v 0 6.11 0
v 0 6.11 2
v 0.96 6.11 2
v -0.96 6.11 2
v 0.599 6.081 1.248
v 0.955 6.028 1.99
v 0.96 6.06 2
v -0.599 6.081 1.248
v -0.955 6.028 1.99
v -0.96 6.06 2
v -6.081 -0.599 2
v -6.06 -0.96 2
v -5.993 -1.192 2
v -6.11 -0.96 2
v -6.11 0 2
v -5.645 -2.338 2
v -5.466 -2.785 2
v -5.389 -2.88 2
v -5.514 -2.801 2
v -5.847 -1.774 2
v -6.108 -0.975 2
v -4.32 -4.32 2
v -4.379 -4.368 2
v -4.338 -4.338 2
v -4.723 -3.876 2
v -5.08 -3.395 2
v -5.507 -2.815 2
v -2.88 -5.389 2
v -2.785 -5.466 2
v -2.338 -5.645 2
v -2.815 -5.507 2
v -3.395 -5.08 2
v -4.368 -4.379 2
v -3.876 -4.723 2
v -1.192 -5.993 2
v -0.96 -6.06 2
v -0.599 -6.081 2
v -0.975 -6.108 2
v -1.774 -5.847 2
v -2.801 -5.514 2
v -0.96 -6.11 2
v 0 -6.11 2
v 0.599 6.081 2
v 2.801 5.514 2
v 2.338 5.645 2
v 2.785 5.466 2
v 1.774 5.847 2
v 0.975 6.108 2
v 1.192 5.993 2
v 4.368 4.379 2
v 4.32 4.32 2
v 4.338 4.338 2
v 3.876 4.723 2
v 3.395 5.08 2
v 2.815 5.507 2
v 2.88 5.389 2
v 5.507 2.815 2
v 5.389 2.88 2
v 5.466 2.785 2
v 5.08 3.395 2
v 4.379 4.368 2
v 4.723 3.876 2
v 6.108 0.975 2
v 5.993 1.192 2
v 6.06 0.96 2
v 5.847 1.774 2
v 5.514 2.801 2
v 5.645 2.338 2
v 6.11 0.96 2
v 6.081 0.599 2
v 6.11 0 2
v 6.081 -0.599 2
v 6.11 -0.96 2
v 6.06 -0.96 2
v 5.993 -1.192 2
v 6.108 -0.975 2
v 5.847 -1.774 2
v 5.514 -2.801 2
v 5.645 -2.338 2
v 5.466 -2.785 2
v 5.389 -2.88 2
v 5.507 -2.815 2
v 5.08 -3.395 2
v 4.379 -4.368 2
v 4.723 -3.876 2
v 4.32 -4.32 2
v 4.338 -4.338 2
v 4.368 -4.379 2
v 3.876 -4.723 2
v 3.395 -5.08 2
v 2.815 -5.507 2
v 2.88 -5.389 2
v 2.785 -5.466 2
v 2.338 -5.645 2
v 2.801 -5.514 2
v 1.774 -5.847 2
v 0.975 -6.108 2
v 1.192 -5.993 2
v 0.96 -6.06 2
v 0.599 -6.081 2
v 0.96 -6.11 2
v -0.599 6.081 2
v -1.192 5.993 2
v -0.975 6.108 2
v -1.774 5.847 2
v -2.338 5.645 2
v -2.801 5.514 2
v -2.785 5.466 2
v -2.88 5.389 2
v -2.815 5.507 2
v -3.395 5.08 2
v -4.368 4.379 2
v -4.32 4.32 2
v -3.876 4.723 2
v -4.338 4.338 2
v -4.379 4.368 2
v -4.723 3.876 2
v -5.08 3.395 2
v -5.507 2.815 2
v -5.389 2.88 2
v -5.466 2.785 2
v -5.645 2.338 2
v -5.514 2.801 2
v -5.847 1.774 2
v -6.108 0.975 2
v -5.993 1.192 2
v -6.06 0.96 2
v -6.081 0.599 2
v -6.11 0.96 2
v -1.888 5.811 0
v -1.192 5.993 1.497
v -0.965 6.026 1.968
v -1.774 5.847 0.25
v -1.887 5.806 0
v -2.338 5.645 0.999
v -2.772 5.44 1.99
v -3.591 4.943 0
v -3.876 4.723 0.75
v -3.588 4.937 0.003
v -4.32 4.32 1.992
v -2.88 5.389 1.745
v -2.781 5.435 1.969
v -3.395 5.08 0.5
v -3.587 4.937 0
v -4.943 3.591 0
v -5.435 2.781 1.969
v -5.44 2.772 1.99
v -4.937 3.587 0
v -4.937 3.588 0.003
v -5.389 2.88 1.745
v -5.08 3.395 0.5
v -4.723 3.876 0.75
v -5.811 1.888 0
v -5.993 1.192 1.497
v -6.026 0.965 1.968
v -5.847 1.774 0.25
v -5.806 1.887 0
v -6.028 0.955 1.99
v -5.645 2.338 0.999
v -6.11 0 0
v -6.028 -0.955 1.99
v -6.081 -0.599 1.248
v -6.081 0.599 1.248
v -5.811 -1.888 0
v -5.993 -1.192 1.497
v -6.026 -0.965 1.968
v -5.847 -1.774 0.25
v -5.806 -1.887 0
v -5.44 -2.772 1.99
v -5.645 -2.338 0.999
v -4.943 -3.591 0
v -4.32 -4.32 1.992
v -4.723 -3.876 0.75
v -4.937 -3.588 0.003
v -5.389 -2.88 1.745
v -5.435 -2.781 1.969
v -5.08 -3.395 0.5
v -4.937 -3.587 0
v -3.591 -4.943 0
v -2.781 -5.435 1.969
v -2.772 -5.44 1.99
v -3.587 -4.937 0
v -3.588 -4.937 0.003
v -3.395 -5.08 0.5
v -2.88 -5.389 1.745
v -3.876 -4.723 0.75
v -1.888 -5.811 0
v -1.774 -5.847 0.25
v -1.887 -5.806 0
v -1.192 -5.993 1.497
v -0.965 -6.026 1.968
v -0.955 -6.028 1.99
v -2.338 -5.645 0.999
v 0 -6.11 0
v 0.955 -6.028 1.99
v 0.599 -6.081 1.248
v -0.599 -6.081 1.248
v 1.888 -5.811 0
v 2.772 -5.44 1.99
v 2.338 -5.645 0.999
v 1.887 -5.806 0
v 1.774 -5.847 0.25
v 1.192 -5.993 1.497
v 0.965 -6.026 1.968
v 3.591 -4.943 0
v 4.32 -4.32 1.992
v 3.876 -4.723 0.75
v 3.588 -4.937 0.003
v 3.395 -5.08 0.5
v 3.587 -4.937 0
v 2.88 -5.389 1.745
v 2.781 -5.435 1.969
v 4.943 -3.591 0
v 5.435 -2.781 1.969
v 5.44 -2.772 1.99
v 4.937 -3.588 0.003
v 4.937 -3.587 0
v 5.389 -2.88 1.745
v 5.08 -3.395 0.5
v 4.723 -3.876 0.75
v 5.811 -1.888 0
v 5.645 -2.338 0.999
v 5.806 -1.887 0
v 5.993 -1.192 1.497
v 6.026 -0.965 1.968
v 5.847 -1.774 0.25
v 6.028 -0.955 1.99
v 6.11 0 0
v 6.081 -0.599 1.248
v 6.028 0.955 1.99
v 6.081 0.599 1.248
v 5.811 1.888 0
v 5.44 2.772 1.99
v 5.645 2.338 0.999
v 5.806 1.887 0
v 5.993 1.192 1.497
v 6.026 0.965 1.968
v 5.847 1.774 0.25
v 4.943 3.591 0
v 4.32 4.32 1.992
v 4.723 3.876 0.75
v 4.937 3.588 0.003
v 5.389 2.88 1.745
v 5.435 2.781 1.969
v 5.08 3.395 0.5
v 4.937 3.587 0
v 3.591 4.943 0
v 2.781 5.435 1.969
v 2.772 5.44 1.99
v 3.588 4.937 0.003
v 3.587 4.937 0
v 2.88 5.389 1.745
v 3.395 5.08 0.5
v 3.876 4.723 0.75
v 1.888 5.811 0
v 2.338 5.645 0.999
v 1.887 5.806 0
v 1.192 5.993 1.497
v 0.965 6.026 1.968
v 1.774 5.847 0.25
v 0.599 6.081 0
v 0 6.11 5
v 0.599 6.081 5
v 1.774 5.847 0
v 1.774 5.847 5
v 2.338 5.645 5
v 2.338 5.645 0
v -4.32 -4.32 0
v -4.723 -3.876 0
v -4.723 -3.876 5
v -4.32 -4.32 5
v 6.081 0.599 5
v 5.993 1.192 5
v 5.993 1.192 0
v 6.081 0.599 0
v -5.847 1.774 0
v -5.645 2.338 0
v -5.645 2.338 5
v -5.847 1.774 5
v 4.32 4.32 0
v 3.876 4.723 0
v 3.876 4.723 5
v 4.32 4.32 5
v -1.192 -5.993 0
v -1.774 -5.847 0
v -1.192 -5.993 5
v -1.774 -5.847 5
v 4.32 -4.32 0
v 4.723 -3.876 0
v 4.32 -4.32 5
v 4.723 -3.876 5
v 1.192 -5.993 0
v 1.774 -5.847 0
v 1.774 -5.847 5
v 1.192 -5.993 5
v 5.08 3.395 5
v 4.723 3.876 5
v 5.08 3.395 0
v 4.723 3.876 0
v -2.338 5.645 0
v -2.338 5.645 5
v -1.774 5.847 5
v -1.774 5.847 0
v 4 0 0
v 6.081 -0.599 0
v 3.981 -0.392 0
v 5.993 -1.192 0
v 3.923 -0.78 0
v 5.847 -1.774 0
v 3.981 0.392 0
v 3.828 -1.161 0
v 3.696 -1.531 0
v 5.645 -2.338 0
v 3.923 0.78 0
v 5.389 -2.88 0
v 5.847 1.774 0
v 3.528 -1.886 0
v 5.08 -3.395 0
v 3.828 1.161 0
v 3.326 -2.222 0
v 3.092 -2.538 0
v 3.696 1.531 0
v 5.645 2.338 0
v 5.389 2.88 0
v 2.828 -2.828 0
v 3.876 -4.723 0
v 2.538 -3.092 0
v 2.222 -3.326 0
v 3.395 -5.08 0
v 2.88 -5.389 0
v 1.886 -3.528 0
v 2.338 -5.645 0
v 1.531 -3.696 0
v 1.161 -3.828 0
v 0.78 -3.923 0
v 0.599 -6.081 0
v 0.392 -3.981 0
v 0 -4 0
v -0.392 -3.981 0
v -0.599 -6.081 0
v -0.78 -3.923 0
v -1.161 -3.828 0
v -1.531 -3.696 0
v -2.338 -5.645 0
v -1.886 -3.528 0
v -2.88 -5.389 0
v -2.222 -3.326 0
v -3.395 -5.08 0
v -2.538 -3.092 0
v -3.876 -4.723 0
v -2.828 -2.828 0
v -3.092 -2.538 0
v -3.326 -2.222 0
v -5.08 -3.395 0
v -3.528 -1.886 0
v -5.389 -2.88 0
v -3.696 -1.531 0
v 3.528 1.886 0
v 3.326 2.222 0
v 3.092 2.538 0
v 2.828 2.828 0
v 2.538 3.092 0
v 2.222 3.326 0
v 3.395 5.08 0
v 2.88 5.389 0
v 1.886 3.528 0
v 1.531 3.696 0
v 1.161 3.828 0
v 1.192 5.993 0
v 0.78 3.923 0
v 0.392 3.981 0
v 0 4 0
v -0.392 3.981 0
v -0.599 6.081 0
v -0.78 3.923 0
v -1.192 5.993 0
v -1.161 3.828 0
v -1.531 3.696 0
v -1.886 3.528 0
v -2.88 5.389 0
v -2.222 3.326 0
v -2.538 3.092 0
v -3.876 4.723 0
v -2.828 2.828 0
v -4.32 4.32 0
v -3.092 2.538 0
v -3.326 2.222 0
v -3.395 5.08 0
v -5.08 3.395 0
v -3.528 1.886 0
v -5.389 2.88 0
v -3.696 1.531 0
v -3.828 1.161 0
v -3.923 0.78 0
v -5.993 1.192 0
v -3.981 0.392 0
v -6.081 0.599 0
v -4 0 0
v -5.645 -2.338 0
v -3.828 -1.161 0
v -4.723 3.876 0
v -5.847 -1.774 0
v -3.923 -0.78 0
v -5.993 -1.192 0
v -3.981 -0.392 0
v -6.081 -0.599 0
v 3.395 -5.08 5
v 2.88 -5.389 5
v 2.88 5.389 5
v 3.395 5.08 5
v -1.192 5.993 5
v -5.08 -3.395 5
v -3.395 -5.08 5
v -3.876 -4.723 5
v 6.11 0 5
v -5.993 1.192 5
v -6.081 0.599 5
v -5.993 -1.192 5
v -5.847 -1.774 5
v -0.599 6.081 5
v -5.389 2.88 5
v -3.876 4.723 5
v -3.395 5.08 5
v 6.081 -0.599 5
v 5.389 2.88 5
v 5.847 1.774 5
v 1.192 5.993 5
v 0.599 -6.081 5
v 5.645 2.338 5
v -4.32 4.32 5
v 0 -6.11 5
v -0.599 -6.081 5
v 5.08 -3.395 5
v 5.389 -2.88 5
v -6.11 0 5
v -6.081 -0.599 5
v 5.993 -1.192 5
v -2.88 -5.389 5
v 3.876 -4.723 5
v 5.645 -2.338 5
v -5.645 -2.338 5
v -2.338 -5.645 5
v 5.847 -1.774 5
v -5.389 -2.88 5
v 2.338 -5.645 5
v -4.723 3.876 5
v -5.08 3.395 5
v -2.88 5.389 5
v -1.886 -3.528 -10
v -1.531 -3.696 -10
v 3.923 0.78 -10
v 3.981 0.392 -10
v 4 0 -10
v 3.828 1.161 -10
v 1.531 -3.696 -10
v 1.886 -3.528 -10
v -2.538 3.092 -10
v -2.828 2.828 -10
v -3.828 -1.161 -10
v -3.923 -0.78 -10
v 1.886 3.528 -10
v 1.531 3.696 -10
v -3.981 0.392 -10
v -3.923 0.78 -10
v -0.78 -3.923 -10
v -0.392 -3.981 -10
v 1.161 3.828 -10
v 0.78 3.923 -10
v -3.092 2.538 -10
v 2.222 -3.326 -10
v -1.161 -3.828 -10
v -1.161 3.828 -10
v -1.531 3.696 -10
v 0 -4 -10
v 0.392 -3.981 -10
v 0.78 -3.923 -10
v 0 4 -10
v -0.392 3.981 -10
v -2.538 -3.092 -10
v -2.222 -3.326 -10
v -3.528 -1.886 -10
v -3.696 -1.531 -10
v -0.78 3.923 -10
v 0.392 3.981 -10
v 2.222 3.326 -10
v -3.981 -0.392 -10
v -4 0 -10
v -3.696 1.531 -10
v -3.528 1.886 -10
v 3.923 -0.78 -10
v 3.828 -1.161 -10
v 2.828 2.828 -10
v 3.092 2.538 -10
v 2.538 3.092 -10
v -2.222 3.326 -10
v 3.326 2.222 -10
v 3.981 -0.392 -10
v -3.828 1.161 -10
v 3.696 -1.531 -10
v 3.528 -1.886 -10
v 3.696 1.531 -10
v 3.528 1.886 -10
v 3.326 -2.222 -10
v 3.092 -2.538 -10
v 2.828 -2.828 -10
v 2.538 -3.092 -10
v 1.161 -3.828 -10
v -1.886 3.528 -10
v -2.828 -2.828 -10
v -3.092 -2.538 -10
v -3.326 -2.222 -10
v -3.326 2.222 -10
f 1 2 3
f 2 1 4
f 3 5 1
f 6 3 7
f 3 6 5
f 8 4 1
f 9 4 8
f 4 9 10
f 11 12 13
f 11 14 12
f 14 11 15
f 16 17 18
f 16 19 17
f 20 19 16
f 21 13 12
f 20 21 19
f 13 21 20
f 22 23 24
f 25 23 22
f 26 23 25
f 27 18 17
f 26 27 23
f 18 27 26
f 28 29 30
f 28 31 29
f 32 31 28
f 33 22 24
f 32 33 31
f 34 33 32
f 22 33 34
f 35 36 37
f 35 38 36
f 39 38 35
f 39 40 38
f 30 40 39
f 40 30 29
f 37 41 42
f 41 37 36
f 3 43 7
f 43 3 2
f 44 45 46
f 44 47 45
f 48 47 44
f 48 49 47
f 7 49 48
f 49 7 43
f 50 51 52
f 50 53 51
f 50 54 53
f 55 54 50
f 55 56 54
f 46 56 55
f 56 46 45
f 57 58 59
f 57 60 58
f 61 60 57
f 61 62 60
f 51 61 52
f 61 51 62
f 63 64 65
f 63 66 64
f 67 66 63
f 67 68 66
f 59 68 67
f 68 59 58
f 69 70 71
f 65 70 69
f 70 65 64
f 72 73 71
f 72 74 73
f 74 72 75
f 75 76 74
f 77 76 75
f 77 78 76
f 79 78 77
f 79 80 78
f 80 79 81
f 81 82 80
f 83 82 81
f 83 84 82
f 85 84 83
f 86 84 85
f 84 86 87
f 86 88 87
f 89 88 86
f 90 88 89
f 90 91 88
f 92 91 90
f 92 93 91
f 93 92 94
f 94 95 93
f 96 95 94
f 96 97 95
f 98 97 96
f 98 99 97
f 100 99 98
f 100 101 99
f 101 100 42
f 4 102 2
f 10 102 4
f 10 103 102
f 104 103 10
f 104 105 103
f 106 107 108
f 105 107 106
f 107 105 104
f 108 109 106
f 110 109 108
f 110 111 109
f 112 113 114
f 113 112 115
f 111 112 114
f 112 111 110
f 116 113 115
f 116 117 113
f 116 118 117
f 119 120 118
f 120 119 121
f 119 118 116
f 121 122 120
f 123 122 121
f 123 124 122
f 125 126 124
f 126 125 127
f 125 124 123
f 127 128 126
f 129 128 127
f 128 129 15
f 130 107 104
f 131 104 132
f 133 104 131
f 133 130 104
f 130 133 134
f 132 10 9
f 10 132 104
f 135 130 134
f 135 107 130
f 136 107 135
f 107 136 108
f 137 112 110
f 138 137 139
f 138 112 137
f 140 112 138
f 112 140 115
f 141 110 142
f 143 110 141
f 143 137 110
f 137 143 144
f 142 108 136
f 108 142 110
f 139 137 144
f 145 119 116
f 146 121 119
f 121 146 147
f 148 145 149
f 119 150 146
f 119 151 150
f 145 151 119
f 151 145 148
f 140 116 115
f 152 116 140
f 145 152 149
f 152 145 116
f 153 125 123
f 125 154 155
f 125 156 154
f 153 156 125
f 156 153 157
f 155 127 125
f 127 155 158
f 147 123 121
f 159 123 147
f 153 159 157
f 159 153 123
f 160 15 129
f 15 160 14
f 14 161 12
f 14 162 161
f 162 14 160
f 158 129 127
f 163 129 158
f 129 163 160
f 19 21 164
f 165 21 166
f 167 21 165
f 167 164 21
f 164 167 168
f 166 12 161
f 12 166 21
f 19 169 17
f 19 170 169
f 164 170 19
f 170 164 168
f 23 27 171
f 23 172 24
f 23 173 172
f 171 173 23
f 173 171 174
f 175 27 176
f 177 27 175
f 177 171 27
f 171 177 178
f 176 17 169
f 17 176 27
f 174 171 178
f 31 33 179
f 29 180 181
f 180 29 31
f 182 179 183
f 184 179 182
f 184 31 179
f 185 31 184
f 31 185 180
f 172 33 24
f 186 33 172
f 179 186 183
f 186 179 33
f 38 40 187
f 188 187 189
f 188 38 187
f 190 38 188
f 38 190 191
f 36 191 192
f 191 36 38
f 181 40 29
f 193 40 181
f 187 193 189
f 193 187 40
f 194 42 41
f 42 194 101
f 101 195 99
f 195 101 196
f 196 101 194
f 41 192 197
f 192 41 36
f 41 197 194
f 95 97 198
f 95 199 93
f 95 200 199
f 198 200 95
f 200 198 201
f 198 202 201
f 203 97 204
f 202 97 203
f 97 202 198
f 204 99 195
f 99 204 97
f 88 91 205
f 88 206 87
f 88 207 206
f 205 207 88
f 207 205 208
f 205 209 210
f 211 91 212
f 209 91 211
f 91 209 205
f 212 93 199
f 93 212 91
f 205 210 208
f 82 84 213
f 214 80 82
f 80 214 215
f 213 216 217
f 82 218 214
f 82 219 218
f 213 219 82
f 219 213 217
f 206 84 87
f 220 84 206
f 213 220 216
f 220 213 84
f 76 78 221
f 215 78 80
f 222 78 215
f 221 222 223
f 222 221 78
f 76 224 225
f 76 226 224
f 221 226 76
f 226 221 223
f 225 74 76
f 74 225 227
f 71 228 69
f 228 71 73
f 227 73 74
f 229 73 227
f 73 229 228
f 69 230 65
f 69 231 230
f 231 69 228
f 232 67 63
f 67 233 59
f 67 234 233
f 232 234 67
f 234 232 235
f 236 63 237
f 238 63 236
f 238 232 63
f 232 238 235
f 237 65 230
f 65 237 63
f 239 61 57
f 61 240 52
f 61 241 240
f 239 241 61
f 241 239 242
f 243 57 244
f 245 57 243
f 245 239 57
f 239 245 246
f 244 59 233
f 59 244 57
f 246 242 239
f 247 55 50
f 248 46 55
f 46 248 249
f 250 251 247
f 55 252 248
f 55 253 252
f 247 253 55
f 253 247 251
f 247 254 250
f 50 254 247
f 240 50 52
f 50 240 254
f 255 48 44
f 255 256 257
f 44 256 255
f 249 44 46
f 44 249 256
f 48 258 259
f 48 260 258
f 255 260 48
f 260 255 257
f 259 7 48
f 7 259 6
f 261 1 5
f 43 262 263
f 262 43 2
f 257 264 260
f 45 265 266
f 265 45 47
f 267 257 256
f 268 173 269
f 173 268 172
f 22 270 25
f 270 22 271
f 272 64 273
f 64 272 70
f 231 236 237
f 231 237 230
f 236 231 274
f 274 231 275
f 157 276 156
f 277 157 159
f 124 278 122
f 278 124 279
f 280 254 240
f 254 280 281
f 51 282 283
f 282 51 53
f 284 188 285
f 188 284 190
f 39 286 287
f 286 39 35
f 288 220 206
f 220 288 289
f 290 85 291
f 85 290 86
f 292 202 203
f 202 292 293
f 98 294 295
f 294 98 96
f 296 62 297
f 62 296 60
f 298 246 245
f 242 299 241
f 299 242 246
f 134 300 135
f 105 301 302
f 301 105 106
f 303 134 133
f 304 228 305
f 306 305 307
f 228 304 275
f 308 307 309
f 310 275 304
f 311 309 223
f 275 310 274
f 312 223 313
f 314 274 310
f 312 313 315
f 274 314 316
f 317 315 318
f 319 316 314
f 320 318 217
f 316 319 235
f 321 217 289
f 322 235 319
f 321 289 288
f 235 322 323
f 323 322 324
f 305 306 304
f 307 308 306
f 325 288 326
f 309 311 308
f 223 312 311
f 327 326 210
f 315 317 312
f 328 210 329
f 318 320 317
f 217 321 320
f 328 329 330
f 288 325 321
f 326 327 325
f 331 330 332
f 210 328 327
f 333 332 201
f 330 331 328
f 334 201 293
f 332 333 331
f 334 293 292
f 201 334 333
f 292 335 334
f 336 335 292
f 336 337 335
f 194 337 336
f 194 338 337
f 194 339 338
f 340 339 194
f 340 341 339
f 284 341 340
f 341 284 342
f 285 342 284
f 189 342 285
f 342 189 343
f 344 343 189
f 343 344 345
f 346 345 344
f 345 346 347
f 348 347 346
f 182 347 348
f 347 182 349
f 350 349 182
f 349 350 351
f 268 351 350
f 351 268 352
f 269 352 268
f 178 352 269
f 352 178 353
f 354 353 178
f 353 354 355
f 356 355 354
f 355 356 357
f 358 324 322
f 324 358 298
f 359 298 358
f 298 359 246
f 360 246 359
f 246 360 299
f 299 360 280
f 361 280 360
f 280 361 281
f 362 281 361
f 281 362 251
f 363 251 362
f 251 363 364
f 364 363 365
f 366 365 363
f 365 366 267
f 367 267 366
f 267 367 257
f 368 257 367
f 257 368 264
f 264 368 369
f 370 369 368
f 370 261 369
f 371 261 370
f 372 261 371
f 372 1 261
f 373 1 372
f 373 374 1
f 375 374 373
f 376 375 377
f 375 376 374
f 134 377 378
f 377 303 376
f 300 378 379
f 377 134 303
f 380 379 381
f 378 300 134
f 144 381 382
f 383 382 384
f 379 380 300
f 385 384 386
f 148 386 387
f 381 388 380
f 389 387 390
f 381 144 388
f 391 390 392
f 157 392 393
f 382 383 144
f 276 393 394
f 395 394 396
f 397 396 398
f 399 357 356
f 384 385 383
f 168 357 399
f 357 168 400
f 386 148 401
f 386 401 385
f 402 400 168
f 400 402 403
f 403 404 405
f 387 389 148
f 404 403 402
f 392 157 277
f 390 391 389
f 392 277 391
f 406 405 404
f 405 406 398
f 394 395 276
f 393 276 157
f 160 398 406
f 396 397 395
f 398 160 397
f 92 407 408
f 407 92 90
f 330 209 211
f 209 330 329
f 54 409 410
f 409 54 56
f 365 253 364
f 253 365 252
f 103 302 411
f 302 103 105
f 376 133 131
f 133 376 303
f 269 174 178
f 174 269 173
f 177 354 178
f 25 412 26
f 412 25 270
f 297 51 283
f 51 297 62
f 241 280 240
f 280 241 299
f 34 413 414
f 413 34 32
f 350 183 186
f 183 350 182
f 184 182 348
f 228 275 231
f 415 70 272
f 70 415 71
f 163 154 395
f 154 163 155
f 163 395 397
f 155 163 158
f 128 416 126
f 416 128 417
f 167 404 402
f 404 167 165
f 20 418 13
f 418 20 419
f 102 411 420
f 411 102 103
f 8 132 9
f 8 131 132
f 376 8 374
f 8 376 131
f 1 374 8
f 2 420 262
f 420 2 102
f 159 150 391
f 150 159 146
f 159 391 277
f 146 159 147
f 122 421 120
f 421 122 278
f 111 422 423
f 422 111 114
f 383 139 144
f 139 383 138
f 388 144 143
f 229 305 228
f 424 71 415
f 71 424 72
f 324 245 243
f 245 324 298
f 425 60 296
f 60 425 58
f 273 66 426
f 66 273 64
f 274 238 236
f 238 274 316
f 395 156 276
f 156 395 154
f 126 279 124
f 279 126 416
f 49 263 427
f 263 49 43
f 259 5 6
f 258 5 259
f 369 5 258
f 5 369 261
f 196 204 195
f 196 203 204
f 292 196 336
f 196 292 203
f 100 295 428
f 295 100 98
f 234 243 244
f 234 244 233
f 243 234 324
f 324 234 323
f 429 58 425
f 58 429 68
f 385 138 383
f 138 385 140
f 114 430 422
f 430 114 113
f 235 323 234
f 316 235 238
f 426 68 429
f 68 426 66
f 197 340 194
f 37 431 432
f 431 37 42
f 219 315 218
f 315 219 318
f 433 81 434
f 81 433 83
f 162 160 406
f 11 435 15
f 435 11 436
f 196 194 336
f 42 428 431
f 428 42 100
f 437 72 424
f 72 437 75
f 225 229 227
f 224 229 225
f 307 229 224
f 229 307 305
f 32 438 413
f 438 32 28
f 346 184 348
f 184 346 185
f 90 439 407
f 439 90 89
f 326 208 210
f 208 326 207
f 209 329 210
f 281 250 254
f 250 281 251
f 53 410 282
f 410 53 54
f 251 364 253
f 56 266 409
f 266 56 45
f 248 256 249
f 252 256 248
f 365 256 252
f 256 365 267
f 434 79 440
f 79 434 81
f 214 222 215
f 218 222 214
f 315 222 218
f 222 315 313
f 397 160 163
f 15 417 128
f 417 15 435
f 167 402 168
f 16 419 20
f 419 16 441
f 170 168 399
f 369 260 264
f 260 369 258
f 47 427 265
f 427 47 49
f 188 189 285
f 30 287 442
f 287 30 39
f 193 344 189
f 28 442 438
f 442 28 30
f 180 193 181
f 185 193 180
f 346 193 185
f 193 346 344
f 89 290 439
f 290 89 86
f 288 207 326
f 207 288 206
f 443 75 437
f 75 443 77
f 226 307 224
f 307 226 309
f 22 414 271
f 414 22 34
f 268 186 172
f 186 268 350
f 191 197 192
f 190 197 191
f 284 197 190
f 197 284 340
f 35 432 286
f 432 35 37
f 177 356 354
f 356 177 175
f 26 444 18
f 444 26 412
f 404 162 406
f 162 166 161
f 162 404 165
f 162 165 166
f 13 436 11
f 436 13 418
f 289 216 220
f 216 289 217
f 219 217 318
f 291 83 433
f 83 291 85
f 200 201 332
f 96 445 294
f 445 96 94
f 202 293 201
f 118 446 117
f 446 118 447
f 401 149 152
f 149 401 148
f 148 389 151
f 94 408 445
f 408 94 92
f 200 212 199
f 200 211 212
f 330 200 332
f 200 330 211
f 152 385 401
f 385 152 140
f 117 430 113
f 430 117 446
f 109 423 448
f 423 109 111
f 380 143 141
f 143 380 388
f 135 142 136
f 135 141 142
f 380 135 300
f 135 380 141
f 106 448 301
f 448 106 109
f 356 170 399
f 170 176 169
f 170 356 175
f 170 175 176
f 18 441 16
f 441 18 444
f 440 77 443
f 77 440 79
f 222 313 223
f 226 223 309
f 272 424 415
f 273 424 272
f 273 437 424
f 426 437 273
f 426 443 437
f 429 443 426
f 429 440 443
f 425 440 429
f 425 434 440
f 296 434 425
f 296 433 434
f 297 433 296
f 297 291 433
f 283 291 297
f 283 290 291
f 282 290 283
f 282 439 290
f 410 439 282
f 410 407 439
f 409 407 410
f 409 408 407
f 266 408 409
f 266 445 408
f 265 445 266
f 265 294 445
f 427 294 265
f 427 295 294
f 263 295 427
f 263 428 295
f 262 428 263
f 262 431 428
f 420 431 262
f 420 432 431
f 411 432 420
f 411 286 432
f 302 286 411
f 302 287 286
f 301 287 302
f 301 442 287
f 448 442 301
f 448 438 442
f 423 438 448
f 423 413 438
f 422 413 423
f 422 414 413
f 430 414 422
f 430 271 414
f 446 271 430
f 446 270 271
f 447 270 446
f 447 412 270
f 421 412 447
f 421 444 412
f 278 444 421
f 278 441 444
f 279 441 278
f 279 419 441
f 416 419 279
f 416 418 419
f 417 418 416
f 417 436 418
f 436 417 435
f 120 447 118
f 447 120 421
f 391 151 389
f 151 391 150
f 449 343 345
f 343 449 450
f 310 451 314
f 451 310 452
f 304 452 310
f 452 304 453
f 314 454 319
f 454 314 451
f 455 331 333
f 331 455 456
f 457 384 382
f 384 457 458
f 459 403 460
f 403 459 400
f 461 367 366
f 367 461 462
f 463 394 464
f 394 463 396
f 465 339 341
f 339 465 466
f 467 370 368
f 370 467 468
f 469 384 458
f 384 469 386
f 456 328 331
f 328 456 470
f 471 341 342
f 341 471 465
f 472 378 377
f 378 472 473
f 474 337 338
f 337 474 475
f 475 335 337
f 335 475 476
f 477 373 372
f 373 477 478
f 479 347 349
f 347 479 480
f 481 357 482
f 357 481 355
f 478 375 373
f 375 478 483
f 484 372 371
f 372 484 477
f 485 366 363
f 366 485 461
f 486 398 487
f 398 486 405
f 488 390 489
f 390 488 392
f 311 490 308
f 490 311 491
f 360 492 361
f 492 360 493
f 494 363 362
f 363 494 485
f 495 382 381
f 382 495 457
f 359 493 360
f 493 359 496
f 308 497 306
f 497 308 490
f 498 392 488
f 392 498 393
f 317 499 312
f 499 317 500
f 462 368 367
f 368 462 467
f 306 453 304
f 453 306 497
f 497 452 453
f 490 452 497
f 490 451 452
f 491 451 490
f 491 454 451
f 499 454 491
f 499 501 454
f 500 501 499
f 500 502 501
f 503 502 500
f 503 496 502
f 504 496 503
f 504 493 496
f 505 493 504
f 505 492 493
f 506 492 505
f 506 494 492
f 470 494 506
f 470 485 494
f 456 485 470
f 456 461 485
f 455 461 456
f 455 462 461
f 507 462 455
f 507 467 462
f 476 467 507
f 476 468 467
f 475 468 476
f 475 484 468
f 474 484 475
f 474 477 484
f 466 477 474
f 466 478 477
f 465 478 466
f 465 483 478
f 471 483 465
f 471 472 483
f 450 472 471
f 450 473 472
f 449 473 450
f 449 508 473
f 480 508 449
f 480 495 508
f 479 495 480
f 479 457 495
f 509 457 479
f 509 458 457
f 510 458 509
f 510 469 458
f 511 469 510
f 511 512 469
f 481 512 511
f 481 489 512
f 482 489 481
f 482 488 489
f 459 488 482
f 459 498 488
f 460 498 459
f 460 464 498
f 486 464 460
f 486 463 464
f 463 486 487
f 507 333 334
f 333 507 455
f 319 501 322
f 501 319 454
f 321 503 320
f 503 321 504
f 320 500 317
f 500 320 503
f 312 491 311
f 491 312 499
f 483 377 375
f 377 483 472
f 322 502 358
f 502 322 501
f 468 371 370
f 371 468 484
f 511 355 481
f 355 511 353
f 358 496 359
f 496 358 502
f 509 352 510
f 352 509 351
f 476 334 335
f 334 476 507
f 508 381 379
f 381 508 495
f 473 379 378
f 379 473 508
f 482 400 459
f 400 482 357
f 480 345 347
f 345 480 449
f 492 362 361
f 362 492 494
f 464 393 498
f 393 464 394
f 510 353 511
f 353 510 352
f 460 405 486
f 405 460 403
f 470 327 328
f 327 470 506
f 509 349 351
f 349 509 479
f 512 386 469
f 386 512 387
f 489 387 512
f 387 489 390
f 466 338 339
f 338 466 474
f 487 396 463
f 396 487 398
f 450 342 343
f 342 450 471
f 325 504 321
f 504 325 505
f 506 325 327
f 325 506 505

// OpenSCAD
module timing_pulley(teeth=20, pitch_diameter=12.22, belt_width=5, hub_diameter=8, hub_height=10) {
    tooth_height = 2;
    tooth_width = pitch_diameter * PI / teeth;
    pulley_radius = pitch_diameter / 2;
    
    module tooth() {
        translate([0, pulley_radius, 0])
        rotate([90, 0, 0])
        linear_extrude(height=belt_width)
        polygon(points=[[0, 0], [tooth_width / 2, tooth_height], [-tooth_width / 2, tooth_height]]);
    }
    
    union() {
        // Create the main pulley body
        cylinder(h=belt_width, r=pulley_radius, $fn=64);
        
        // Add teeth around the pulley
        for (i = [0:teeth-1]) {
            rotate([0, 0, i * 360 / teeth])
            tooth();
        }
        
        // Add the hub
        translate([0, 0, -hub_height])
        cylinder(h=hub_height + belt_width, r=hub_diameter / 2, $fn=64);
    }
}

timing_pulley();
